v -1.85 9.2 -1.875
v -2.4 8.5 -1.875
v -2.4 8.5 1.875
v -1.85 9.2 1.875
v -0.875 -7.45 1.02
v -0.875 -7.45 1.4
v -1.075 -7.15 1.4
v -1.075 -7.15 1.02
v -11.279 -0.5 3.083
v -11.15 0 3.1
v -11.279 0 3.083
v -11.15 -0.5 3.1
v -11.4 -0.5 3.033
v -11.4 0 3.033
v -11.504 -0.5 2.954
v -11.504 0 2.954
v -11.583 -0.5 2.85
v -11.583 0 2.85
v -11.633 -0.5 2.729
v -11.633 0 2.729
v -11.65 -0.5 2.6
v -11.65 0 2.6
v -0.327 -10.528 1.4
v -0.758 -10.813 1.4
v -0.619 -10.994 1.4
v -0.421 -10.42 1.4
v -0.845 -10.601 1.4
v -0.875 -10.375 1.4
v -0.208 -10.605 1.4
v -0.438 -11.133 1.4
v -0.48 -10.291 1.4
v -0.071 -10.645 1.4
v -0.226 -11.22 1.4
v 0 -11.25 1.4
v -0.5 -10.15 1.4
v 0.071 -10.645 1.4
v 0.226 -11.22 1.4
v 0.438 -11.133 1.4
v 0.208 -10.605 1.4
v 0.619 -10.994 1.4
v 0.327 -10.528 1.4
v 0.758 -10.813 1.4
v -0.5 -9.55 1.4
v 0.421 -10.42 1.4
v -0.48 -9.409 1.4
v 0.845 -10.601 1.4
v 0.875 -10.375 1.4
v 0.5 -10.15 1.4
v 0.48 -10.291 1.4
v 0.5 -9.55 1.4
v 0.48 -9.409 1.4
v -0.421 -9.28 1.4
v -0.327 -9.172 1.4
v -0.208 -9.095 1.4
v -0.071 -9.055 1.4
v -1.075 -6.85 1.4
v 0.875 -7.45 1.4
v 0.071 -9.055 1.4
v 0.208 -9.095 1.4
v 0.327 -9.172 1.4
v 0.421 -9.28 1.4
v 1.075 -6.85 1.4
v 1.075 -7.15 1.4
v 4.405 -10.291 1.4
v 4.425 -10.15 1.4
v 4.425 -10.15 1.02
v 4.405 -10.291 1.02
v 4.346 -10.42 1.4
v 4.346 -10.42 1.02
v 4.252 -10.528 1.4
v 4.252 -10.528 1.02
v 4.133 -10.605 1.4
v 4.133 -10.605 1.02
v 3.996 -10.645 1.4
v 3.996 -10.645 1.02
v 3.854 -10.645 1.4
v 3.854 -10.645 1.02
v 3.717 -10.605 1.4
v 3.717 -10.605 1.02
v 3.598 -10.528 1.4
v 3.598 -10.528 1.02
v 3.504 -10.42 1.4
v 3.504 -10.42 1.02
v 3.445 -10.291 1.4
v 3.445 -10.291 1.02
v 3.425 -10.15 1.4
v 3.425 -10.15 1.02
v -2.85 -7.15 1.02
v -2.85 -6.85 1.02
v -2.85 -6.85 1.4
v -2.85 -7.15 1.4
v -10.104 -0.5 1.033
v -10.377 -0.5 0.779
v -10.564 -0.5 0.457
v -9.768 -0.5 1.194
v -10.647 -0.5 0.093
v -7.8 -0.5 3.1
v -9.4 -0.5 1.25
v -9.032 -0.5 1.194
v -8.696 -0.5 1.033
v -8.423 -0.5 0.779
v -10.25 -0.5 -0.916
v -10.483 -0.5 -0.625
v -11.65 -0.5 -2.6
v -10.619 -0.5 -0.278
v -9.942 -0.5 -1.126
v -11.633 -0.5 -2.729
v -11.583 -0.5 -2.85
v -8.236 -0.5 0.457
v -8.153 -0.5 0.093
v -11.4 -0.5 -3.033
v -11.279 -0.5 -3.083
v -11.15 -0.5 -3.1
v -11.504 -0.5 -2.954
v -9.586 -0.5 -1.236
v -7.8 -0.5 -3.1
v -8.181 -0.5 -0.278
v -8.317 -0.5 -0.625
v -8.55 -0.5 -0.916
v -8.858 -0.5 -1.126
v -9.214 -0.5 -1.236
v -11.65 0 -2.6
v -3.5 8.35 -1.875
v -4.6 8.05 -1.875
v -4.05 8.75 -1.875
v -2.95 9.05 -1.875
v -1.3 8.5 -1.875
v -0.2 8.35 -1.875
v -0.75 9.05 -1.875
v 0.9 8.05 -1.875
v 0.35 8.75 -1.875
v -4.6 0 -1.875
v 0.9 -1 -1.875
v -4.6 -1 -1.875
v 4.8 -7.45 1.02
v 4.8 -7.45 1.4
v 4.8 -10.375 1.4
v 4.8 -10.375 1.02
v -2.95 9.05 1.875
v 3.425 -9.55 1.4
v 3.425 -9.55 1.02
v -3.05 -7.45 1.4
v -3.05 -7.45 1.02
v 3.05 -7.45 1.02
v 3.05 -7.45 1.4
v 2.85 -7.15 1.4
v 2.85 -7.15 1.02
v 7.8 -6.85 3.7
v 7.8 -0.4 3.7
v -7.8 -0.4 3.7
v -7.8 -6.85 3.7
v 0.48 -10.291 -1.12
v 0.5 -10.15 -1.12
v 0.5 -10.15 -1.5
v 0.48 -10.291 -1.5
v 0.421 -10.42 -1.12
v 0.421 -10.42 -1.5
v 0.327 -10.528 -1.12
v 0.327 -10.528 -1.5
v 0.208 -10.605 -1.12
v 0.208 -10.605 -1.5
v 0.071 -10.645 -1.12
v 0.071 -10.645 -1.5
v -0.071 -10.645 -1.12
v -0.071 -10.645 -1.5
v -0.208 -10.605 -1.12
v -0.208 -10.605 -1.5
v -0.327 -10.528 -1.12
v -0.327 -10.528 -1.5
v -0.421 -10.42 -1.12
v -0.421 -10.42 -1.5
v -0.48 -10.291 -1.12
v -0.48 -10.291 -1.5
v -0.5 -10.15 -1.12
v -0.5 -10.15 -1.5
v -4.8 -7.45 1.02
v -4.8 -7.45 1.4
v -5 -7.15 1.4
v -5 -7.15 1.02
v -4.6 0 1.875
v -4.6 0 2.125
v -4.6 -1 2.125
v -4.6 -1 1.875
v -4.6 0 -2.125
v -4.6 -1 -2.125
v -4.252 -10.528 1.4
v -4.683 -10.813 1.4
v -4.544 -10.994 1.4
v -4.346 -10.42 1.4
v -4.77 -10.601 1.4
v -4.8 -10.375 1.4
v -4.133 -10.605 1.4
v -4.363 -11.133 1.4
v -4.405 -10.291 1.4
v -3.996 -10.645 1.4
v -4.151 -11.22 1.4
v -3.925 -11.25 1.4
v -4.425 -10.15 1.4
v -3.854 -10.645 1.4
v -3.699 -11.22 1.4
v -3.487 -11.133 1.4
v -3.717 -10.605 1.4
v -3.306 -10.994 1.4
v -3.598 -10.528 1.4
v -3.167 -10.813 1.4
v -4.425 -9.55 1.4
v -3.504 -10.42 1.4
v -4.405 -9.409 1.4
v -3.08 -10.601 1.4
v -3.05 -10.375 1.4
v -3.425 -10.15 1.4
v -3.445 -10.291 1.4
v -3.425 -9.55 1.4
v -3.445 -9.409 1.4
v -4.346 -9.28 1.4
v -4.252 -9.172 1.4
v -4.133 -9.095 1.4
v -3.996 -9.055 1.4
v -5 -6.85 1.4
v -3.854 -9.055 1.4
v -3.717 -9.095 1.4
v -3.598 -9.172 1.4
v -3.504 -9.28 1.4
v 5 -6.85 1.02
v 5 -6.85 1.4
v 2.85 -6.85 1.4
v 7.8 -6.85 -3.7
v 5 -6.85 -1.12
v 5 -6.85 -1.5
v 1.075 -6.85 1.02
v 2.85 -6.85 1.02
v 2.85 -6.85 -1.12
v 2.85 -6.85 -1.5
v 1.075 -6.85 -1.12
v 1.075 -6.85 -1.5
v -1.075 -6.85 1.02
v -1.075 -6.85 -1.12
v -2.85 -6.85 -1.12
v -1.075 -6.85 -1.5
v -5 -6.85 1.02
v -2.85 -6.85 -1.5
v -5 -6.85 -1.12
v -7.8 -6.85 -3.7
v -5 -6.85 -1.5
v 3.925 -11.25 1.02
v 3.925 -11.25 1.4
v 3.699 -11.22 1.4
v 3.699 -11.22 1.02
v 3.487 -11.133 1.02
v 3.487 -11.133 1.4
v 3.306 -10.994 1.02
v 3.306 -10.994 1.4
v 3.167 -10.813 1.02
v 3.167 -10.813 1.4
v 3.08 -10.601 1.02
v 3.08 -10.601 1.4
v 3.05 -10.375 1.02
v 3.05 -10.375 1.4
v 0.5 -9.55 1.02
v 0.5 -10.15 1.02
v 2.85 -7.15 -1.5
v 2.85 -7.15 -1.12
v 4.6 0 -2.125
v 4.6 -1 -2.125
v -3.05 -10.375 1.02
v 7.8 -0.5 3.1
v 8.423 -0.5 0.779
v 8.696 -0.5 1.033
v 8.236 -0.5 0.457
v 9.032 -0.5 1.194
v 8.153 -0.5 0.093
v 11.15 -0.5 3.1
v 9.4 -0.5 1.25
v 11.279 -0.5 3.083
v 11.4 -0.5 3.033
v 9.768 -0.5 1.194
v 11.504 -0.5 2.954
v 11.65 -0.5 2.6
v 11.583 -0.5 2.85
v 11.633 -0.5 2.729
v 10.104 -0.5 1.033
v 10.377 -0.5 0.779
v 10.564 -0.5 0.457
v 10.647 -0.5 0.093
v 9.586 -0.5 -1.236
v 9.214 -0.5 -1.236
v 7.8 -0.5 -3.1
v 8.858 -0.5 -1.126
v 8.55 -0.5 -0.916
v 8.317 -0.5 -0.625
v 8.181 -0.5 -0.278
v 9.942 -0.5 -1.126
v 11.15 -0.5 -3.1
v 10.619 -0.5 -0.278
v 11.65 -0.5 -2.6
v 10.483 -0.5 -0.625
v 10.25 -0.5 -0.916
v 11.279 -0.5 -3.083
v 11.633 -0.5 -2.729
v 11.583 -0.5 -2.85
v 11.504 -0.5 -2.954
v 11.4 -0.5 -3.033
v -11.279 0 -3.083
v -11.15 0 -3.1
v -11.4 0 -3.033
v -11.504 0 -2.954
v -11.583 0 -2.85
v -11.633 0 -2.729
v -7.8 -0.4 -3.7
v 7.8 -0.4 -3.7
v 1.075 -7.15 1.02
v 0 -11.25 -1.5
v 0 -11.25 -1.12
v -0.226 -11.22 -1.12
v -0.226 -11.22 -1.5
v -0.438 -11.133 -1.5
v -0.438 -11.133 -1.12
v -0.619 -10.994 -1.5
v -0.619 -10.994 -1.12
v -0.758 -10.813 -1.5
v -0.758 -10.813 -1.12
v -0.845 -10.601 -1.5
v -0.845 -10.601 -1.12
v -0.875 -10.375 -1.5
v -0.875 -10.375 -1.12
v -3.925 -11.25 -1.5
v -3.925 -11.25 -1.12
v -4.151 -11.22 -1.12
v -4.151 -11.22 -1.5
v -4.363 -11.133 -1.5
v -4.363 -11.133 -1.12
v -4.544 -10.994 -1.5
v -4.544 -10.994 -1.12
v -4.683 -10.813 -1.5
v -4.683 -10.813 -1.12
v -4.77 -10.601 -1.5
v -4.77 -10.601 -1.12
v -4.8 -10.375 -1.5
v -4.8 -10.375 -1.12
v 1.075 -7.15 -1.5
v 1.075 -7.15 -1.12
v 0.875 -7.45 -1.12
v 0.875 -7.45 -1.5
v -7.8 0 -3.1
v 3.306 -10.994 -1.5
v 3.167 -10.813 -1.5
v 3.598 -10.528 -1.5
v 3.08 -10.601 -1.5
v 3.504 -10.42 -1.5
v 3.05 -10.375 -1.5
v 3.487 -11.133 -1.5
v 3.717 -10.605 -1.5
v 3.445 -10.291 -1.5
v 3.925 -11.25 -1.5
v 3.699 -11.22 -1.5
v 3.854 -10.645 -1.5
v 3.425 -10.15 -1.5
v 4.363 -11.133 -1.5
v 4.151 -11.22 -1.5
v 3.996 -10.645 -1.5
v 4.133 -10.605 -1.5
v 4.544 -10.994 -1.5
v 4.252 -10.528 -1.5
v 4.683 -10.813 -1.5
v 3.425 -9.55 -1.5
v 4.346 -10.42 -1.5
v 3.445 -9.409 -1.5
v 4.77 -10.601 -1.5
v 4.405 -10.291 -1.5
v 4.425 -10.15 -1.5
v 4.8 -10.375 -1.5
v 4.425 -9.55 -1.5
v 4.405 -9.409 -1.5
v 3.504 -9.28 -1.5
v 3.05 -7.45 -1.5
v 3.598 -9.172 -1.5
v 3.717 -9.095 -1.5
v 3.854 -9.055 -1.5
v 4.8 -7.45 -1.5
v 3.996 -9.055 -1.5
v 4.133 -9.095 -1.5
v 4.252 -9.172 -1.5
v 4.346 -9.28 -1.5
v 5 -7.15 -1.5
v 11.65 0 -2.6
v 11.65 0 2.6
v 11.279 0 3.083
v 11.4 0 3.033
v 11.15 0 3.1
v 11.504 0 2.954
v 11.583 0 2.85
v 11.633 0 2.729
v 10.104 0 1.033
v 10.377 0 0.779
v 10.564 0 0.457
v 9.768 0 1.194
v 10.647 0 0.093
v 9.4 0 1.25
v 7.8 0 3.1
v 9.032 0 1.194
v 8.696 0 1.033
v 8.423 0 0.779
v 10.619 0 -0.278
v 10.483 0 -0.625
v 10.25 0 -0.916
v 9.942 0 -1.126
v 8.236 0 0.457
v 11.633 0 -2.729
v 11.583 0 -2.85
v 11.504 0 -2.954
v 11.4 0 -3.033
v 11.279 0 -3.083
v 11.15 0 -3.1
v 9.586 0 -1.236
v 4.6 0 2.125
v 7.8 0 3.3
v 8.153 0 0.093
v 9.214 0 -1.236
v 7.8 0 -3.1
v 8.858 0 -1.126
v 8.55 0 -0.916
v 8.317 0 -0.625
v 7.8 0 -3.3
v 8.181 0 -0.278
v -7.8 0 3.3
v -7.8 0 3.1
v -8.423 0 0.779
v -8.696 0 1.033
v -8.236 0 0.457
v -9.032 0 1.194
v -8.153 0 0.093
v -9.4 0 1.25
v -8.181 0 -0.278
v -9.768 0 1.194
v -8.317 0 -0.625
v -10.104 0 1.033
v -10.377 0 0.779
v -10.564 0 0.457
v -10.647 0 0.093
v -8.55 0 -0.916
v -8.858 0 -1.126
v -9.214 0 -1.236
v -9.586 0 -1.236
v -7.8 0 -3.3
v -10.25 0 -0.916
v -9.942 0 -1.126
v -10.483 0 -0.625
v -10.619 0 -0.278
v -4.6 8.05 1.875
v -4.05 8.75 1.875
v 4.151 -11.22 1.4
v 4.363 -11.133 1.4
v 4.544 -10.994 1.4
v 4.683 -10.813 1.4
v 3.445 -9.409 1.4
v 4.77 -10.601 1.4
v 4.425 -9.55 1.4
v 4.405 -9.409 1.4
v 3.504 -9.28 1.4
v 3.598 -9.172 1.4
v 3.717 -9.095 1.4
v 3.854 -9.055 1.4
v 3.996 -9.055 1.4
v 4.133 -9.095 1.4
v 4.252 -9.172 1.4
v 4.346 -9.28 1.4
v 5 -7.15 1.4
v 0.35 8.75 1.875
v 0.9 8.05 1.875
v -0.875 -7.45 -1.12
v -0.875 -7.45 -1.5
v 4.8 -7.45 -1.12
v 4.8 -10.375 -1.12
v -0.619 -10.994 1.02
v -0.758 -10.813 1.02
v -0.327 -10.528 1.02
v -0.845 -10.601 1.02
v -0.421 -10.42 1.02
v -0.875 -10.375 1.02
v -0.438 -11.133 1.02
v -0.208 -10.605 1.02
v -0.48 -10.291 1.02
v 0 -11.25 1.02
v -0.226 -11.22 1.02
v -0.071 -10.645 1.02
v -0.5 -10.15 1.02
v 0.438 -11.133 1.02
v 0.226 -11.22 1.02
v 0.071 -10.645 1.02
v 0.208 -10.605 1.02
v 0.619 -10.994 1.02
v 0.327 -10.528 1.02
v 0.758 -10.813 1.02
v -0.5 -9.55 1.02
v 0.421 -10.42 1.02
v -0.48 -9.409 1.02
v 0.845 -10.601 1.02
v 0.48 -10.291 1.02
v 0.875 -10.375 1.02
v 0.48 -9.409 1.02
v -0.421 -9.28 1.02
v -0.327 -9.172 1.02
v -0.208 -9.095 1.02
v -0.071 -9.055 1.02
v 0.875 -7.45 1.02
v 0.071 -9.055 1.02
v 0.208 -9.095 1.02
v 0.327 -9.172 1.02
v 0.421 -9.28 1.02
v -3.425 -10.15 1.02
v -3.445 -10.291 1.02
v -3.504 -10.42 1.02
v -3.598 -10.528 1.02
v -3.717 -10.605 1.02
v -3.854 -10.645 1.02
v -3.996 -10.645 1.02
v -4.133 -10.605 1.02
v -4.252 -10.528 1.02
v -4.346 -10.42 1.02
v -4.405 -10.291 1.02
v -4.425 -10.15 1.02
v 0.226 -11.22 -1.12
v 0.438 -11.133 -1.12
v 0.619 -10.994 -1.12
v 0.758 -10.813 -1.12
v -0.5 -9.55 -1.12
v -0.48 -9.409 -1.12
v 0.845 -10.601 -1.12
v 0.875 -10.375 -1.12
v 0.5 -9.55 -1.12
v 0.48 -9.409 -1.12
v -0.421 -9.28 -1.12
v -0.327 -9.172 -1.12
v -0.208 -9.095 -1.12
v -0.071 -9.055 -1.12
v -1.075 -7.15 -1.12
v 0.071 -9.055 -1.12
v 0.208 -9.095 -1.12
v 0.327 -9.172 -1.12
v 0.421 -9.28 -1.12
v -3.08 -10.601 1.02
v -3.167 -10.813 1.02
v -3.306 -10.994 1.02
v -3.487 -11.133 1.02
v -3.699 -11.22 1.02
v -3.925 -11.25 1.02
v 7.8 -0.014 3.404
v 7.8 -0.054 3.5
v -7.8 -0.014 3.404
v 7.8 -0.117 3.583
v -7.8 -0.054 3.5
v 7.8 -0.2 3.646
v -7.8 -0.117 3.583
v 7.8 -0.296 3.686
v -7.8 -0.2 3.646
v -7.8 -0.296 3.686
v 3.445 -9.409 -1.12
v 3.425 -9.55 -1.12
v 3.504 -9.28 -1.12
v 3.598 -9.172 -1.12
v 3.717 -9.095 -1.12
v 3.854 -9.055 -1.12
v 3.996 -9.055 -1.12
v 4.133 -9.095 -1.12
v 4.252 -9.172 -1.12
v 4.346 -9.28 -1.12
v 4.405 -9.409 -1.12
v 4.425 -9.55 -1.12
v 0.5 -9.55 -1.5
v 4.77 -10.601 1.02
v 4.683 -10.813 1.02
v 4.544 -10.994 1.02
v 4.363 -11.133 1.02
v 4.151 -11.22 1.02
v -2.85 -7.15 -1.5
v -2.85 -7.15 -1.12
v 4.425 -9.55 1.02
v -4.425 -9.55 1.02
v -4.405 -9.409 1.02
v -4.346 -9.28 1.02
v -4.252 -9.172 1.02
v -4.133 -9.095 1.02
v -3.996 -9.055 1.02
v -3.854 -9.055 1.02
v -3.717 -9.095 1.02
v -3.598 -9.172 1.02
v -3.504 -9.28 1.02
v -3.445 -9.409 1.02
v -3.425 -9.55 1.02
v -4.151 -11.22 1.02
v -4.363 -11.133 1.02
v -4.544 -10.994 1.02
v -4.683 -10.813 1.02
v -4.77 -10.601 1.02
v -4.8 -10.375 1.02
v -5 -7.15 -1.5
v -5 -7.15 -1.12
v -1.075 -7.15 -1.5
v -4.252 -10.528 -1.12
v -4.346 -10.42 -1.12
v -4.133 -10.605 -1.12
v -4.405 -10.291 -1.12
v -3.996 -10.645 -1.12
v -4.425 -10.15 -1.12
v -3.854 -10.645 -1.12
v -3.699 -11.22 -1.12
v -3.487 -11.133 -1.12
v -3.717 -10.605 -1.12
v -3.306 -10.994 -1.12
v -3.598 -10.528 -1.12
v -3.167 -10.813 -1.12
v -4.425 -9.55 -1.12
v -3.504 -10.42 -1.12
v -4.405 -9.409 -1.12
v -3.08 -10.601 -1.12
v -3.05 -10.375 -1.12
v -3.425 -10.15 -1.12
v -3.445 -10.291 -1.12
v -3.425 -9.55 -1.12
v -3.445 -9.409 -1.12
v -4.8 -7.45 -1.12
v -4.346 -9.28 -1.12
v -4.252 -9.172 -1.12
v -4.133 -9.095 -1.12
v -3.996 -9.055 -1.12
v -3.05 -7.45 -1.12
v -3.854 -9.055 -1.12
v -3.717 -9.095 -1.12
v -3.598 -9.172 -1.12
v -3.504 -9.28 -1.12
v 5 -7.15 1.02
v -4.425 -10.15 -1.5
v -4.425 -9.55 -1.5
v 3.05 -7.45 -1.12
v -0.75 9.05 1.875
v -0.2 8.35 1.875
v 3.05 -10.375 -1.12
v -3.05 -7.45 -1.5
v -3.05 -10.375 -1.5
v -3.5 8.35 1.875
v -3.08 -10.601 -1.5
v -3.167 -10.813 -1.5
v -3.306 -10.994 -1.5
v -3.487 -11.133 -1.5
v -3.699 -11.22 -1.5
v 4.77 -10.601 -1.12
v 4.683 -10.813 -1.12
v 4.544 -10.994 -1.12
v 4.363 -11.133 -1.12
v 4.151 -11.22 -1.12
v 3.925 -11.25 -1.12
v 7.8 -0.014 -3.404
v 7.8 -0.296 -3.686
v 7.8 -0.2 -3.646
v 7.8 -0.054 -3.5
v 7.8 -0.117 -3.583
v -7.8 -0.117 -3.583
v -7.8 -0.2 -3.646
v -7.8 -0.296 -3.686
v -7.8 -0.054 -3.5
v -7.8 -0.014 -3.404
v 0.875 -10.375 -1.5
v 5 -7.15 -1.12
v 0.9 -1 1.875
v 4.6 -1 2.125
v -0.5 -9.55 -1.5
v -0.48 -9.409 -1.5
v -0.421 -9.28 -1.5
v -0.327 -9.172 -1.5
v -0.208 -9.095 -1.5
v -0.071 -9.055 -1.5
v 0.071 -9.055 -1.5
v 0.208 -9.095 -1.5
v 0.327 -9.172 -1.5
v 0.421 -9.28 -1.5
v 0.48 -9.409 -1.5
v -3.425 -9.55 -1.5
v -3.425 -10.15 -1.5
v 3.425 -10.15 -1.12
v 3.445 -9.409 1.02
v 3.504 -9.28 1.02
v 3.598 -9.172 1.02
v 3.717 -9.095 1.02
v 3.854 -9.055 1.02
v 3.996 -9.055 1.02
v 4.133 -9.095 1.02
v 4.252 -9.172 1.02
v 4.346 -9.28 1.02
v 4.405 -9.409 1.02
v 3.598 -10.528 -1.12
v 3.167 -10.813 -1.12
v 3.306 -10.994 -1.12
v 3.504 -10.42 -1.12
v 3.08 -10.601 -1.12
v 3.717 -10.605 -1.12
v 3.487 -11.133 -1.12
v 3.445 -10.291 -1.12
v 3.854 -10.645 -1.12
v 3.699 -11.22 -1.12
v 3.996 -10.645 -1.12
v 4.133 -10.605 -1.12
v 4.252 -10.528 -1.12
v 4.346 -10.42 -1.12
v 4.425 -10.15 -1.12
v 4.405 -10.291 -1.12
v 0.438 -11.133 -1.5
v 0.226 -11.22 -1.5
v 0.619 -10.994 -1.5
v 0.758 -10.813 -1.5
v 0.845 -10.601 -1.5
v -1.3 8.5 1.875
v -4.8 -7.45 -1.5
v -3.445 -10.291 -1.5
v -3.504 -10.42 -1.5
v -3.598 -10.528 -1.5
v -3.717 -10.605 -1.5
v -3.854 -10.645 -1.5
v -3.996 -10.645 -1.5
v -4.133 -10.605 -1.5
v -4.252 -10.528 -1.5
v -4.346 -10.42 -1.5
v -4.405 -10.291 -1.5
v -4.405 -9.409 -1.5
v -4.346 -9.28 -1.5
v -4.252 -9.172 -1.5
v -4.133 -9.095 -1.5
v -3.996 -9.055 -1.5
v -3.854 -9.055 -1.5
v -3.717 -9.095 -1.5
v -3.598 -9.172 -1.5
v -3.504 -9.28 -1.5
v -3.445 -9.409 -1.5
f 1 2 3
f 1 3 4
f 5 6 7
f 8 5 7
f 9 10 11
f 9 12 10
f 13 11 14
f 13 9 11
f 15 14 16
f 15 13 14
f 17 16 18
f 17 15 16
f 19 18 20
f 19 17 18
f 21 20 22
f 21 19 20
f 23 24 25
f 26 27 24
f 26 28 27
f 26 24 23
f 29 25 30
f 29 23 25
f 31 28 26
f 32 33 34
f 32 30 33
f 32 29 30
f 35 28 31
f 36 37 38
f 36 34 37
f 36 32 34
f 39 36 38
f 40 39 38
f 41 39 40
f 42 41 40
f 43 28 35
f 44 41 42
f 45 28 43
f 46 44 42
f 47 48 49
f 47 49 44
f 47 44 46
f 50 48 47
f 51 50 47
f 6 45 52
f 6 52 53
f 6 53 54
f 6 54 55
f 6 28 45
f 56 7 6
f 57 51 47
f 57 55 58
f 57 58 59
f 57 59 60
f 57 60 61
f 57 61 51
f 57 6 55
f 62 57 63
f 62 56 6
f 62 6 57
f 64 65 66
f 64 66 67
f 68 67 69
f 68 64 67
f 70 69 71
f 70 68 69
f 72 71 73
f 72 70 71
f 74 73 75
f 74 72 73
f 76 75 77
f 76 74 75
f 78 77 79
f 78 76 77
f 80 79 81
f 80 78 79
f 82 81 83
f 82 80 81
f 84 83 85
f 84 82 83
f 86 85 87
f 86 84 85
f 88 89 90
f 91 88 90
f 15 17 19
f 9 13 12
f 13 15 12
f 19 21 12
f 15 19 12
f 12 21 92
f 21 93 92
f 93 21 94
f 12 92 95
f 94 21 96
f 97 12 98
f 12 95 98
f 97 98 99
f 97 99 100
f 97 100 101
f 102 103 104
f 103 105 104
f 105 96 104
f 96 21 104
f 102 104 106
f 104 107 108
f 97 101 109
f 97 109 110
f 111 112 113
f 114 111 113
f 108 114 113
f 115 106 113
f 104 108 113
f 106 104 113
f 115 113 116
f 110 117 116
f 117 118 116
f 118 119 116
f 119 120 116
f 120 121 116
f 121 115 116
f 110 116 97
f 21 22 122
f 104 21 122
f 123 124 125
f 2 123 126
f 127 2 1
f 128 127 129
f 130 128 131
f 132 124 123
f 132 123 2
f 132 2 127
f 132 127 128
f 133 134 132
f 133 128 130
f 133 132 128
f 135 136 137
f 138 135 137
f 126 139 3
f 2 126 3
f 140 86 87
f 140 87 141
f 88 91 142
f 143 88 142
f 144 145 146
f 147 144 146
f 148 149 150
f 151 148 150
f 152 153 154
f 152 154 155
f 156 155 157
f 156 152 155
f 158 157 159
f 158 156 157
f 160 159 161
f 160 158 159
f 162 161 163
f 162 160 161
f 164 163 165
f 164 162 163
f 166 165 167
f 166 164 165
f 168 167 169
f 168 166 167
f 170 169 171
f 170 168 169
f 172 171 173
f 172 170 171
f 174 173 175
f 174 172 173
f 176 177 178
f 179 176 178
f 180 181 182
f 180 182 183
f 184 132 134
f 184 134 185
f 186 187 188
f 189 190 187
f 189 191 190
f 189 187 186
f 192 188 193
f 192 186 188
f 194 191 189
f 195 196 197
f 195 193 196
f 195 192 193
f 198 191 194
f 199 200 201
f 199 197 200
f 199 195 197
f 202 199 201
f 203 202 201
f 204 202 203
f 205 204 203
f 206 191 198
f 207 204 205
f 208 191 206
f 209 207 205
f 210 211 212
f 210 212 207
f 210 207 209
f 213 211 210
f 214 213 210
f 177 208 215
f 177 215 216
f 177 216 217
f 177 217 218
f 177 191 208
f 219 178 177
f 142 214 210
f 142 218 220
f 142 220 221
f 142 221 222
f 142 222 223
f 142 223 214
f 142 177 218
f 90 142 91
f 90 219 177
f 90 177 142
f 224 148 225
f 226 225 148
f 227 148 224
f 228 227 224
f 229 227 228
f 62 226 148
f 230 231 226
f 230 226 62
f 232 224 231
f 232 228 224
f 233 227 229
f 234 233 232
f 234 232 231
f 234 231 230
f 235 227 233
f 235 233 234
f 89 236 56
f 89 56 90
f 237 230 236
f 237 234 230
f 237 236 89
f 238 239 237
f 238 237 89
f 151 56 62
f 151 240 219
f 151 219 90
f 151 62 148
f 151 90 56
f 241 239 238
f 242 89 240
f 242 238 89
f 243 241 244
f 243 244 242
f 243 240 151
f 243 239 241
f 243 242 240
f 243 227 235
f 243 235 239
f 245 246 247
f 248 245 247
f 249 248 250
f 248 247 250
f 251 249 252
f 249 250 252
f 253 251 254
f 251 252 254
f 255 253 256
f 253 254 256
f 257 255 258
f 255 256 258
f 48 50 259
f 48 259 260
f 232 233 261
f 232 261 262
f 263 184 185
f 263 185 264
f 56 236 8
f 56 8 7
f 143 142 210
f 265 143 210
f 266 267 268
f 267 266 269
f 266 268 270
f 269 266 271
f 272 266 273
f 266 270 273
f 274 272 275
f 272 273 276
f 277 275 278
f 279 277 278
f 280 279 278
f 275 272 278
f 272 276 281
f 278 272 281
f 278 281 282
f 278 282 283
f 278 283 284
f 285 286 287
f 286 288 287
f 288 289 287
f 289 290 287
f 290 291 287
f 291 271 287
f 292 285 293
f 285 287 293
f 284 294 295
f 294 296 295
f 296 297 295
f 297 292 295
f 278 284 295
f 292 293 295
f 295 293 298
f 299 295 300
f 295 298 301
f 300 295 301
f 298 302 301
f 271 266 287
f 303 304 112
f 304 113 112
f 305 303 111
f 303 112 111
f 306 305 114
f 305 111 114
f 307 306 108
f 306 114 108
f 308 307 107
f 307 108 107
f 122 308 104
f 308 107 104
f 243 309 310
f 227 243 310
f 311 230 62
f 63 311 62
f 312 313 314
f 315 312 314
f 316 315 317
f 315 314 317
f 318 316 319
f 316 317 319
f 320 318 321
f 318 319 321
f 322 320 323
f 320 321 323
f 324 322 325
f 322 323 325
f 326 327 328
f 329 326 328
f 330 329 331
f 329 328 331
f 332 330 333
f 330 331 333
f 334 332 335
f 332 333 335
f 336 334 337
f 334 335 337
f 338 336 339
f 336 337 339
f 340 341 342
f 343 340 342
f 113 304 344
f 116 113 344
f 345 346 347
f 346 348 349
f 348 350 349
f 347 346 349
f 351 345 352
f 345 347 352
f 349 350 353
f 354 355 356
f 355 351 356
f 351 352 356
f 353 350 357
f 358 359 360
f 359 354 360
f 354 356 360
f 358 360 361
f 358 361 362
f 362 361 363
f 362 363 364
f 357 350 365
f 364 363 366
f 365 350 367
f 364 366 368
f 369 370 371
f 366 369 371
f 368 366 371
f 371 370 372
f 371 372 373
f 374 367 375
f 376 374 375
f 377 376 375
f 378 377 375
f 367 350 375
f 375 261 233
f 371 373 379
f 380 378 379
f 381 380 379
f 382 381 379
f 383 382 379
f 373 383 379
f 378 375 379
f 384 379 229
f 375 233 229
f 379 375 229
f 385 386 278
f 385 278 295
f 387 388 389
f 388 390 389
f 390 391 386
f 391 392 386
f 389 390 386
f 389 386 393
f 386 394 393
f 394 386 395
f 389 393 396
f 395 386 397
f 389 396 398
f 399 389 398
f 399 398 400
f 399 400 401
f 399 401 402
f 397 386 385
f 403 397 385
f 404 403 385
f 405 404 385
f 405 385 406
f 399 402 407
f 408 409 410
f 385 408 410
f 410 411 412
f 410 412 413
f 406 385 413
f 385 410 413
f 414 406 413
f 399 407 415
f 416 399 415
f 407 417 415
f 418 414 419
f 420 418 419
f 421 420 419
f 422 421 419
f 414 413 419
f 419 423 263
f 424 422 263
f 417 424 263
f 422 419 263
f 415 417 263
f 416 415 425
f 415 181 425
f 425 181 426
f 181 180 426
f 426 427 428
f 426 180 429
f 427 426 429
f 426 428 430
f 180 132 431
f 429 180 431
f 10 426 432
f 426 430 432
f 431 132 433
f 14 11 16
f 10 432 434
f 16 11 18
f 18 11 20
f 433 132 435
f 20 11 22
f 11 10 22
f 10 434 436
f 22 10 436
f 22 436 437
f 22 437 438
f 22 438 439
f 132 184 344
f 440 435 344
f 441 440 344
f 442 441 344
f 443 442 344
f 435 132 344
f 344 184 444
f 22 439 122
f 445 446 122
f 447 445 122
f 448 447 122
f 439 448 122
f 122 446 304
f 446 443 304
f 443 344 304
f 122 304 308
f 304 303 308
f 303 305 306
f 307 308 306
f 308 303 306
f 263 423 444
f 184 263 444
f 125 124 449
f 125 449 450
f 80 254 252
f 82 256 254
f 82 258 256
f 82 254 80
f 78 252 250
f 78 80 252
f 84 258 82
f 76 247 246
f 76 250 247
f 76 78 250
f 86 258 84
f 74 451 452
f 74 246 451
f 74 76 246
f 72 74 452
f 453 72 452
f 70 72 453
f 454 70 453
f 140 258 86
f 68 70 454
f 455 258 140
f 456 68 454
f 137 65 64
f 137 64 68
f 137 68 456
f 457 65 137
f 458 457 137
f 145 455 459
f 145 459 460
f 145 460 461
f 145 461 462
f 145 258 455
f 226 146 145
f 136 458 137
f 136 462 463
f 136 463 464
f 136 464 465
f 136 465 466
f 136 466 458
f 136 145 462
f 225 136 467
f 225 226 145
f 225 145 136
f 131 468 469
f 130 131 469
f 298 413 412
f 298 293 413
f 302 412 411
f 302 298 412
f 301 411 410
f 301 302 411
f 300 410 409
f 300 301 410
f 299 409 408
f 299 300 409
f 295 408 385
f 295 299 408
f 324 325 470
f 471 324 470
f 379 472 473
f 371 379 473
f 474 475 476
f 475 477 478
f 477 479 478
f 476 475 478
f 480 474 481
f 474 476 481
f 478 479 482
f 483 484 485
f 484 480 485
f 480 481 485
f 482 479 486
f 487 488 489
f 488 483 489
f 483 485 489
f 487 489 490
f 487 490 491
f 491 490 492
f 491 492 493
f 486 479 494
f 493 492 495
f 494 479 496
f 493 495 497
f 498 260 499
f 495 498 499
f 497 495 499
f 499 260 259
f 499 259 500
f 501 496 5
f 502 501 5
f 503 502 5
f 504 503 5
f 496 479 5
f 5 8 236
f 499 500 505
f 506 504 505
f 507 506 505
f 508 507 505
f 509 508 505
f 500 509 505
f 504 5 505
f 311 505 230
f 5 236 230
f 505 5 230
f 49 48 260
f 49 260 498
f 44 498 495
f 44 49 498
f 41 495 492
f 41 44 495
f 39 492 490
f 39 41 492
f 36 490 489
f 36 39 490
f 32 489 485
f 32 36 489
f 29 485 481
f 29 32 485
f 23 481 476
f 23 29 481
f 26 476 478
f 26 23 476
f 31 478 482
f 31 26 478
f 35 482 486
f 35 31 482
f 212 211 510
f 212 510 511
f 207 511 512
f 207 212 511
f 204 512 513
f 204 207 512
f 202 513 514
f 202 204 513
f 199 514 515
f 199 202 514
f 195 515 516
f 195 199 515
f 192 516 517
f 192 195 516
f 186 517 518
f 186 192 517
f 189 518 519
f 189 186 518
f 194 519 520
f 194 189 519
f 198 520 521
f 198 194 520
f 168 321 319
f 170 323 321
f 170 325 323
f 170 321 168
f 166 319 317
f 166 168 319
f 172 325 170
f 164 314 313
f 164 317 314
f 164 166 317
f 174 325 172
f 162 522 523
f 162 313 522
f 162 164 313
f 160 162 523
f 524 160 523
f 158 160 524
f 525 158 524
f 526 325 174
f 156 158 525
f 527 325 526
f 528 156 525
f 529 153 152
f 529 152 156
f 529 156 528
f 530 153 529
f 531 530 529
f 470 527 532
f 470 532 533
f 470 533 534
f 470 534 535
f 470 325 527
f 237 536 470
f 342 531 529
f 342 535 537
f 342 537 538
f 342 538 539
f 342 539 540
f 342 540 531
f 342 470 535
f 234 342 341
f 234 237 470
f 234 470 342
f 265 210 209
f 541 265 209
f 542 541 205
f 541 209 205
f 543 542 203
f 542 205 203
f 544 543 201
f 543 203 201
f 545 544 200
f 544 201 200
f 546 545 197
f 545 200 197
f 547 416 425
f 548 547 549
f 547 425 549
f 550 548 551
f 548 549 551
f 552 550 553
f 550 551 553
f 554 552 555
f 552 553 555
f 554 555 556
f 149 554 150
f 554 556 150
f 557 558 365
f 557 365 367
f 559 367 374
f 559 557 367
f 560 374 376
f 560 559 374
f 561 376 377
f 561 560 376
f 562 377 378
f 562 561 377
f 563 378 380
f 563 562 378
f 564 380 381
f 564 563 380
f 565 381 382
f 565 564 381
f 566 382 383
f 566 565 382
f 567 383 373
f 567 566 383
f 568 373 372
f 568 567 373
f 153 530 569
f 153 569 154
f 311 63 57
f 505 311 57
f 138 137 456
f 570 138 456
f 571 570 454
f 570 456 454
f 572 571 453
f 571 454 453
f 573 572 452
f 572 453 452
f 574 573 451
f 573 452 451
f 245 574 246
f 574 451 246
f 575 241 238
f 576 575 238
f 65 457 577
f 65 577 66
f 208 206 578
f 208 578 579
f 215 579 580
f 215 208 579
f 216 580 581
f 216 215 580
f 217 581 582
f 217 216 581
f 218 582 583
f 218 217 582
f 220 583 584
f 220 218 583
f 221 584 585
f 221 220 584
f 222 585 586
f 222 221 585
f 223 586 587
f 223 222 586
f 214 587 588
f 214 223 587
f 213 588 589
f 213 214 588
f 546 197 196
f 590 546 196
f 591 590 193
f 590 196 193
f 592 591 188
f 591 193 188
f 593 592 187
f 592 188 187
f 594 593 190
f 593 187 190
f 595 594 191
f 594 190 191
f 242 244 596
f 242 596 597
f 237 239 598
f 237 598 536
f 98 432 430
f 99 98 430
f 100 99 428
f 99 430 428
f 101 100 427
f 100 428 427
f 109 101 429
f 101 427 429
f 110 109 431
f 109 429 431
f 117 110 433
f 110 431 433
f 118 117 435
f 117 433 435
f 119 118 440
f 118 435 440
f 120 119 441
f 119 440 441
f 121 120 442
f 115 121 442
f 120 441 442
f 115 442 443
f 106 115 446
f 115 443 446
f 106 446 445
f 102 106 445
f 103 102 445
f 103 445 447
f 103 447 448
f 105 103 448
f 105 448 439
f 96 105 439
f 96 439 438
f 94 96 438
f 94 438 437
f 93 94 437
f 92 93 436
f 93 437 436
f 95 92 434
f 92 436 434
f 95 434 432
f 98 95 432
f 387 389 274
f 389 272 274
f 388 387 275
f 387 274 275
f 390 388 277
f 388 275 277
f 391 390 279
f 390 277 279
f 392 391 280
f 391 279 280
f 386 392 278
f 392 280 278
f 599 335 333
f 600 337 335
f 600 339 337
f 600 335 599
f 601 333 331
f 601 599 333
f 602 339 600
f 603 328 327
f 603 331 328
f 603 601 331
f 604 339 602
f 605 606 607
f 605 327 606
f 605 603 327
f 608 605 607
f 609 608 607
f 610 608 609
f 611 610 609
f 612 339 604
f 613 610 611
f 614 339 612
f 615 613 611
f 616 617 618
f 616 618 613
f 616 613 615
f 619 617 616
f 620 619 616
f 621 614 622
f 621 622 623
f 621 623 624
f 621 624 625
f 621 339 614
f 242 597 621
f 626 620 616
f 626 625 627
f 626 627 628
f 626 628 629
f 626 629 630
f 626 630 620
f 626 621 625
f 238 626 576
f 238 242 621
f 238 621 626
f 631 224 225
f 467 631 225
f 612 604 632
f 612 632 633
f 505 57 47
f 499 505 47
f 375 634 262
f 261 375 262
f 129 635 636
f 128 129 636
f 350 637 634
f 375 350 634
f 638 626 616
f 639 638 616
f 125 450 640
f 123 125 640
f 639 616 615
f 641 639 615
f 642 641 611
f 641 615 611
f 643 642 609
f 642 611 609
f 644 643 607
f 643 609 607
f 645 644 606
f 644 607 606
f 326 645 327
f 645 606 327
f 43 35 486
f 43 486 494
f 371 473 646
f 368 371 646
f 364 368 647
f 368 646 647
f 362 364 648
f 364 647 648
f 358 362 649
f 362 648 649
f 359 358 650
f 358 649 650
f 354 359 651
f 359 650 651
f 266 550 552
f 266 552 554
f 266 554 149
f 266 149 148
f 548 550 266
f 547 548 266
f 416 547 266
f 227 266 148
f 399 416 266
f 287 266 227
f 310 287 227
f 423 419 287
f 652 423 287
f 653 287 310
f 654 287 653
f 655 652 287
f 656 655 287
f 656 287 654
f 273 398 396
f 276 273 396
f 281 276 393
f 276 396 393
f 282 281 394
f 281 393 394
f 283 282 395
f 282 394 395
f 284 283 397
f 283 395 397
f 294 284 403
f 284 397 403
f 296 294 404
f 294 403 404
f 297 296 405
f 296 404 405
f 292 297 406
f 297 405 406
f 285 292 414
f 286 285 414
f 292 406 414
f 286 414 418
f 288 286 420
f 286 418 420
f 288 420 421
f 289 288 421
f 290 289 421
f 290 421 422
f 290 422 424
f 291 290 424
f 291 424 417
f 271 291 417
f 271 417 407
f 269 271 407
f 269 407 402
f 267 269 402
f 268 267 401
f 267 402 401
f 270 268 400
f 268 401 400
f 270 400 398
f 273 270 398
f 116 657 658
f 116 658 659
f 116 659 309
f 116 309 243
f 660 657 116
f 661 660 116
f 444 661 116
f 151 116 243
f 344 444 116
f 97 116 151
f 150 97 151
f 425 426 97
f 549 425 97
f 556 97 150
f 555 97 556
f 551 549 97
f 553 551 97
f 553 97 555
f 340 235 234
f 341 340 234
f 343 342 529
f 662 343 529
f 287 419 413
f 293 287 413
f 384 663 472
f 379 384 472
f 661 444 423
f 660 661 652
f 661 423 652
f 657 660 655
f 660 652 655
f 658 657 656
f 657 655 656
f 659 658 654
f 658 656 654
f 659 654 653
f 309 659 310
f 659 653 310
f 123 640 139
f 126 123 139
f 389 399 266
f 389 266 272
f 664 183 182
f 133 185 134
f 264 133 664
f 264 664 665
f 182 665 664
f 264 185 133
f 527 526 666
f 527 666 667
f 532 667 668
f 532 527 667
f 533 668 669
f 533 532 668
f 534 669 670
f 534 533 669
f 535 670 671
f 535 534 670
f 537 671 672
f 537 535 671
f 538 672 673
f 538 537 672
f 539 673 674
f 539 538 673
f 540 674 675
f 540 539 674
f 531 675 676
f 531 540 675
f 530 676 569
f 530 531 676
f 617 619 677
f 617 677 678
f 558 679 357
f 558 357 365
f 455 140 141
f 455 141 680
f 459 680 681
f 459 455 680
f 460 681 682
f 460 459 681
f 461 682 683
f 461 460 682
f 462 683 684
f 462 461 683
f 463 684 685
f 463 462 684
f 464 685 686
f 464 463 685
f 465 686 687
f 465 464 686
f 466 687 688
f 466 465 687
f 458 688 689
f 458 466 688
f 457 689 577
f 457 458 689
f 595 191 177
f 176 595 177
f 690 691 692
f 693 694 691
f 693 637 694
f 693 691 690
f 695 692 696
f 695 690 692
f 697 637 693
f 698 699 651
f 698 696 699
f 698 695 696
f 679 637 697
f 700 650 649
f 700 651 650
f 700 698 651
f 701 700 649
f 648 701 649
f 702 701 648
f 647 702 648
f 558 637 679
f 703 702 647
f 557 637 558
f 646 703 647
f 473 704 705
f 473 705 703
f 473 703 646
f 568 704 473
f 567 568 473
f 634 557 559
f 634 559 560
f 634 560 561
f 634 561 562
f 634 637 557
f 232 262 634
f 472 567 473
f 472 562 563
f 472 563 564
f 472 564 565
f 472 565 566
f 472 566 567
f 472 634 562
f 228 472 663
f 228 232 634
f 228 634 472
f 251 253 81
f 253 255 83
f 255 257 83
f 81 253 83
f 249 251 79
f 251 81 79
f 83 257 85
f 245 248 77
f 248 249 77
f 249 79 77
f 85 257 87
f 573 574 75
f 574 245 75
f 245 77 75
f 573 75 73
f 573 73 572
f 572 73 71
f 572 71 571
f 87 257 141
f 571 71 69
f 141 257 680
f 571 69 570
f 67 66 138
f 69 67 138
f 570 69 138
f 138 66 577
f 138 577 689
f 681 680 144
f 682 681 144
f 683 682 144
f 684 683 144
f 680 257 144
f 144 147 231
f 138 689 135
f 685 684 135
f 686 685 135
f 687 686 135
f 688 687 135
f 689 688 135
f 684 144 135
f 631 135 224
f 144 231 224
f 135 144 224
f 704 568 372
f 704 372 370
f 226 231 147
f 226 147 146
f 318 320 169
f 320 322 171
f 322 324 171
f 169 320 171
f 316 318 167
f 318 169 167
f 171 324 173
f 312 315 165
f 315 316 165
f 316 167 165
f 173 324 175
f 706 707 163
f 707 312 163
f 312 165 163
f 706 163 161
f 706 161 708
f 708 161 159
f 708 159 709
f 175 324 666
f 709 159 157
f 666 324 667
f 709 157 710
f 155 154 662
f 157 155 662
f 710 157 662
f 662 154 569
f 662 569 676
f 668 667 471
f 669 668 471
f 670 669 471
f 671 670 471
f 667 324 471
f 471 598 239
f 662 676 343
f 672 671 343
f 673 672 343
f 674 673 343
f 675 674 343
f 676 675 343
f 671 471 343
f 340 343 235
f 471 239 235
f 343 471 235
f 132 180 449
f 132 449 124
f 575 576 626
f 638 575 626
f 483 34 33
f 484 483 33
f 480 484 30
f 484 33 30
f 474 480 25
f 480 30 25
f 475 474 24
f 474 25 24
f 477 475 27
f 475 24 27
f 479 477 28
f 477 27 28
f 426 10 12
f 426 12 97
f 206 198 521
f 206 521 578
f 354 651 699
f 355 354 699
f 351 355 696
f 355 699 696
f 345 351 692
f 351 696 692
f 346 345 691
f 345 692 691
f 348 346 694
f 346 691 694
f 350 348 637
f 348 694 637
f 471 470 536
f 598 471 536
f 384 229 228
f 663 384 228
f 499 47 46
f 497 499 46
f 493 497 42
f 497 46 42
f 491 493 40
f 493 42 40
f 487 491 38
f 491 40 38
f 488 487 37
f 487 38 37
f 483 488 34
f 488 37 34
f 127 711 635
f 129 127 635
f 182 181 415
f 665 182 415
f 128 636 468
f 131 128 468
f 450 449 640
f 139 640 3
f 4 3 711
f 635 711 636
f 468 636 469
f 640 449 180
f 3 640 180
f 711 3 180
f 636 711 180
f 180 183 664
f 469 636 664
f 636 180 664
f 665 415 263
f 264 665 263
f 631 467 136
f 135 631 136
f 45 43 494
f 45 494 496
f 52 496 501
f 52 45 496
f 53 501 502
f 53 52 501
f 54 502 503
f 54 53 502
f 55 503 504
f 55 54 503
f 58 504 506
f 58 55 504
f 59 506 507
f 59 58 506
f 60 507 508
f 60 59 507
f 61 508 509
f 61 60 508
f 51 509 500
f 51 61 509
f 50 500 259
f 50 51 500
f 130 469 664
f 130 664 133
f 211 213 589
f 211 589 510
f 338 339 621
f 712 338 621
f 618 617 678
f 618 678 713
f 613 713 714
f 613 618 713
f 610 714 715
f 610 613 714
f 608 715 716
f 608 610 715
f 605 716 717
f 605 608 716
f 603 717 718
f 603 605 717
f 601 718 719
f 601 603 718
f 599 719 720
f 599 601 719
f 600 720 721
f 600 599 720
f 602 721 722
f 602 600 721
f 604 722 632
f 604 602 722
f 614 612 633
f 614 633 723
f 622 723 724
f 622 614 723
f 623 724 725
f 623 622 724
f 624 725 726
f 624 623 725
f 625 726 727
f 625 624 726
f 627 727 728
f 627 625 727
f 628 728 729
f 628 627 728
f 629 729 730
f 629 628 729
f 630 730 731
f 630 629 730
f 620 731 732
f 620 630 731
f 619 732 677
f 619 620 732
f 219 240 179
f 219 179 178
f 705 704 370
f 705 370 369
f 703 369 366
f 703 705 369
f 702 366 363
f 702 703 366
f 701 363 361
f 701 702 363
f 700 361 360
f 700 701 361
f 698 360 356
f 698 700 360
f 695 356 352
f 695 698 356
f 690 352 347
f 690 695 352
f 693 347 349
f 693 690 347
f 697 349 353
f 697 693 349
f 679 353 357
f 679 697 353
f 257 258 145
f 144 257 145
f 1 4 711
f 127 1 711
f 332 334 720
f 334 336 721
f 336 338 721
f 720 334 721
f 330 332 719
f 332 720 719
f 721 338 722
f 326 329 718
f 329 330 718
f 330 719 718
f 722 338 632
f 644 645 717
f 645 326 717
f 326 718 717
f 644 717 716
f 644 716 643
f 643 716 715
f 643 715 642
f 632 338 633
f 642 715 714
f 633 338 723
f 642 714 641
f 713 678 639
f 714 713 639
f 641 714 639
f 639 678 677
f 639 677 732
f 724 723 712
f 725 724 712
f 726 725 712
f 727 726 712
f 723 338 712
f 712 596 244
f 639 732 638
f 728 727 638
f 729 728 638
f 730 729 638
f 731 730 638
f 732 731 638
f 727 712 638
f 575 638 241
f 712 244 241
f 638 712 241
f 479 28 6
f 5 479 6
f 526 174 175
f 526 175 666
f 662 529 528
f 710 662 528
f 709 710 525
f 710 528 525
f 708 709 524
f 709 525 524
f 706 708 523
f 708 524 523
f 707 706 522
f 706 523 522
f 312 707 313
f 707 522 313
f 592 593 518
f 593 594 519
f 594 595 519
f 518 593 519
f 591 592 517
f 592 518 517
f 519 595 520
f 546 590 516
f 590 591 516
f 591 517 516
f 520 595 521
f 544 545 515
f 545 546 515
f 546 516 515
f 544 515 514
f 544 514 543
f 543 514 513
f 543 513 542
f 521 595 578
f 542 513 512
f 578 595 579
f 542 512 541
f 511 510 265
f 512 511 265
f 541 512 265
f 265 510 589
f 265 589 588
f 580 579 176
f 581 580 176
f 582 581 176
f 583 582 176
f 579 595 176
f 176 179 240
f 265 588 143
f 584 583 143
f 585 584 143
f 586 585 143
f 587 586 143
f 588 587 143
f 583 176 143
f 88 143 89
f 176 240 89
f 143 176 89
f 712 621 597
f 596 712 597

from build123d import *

# Parameters (mm, degrees)
ESQUISSE1_W           = 3.85
ESQUISSE1_H           = 6.2
ESQUISSE1_R           = 1.25
PLAQUE_DEPTH          = 0.5
CORPS_DEPTH           = 6.85
CONG_R                = 0.5
ESQUISSE2_W           = 9.2
ESQUISSE2_H           = 4.25
CAVIT_DEPTH           = 1
ESQUISSE3_W           = 5.5
ESQUISSE3_H           = 3.75
BOUTON_DEPTH          = 10.2
RELIEF_DEPTH          = 16.856958252
CONG_2_R              = 0.4
ESQUISSE6_W           = 2.15
ESQUISSE6_H           = 0.38
PIN_DEPTH             = 4.4
ARRONDI_DEPTH         = 0.38
PERCAGE_DEPTH         = 0.38
R_P_TITION_COUNT      = 3
R_P_TITION_PITCH      = 3.925
R_P_TITION_COUNT_DIR2 = 2
R_P_TITION_PITCH_DIR2 = 2.52


with BuildPart() as part:
    # Esquisse1 → Plaque (new body)
    # profile 1 of 2: a face of its own
    with BuildSketch(Plane(origin=(0, 0, 0), x_dir=(1, 0, 0), z_dir=(0, 1, 0))):
        with Locations((-9.725, 0)):
            Rectangle(ESQUISSE1_W, ESQUISSE1_H)
        with Locations(Location((-9.4, 0, 0), (0, 0, 270))):
            Circle(ESQUISSE1_R, mode=Mode.SUBTRACT)
    # profile 2 of 2: a face of its own
    with BuildSketch(Plane(origin=(0, 0, 0), x_dir=(1, 0, 0), z_dir=(0, 1, 0))):
        with Locations((9.725, 0)):
            Rectangle(ESQUISSE1_W, ESQUISSE1_H)
        with Locations(Location((9.4, 0, 0), (0, 0, 270))):
            Circle(ESQUISSE1_R, mode=Mode.SUBTRACT)
    extrude(amount=-PLAQUE_DEPTH)

    # Esquisse1<5> → Corps (add)
    with BuildSketch(Plane(origin=(0, 0, 0), x_dir=(1, 0, 0), z_dir=(0, 1, 0))):
        Polygon((7.8, 3.1), (7.8, -3.1), (7.8, -3.7), (-7.8, -3.7), (-7.8, -3.1), (-7.8, 3.1), (-7.8, 3.7), (7.8, 3.7), align=None)
    extrude(amount=-CORPS_DEPTH)

    # Congé
    cong_edges = [part.edges().sort_by_distance(p)[0] for p in [
        (-11.65, -0.25, 3.1),
        (-11.65, -0.25, -3.1),
        (11.65, -0.25, -3.1),
        (11.65, -0.25, 3.1),
    ]]
    fillet(cong_edges, radius=CONG_R)

    # Esquisse2 → Cavité (cut)
    with BuildSketch(Plane(origin=(0, 0, 0), x_dir=(1, 0, 0), z_dir=(0, 1, 0))):
        Rectangle(ESQUISSE2_W, ESQUISSE2_H)
    extrude(amount=-CAVIT_DEPTH, mode=Mode.SUBTRACT)

    # Esquisse3 → Bouton (add)
    with BuildSketch(Plane(origin=(0, -1, 0), x_dir=(1, 0, 0), z_dir=(0, 1, 0))):
        with Locations((-1.85, 0)):
            Rectangle(ESQUISSE3_W, ESQUISSE3_H)
    extrude(amount=BOUTON_DEPTH)

    # Esquisse5 → Relief (cut, through all)
    with BuildSketch(Plane.XY.offset(1.875)):
        Polygon((-4.6, 9.2), (-4.6, 8.05), (-4.05, 8.75), (-3.5, 8.35), (-2.95, 9.05), (-2.4, 8.5), (-1.85, 9.2), align=None)
        Polygon((0.9, 9.2), (-1.85, 9.2), (-1.3, 8.5), (-0.75, 9.05), (-0.2, 8.35), (0.35, 8.75), (0.9, 8.05), align=None)
    extrude(amount=-RELIEF_DEPTH, mode=Mode.SUBTRACT)

    # Congé2
    cong_2_edges = [part.edges().sort_by_distance(p)[0] for p in [
        (0, 0, -3.7),
        (0, 0, 3.7),
    ]]
    fillet(cong_2_edges, radius=CONG_2_R)

    # Esquisse6 → Pin (add)
    with BuildSketch(Plane.XZ.offset(6.85)):
        with Locations((-3.925, 1.21)):
            Rectangle(ESQUISSE6_W, ESQUISSE6_H)
    pin = extrude(amount=PIN_DEPTH)

    # Esquisse8 → Arrondi (cut)
    with BuildSketch(Plane.XY.offset(1.4)):
        with BuildLine():
            Line((-4.8, -7.45), (-5, -7.15))
            Line((-5, -7.15), (-5, -11.25))
            Line((-5, -11.25), (-3.925, -11.25))
            ThreePointArc((-3.925, -11.25), (-4.543718434, -10.993718434), (-4.8, -10.375))
            Line((-4.8, -10.375), (-4.8, -7.45))
        make_face()
        with BuildLine():
            Line((-2.85, -11.25), (-2.85, -7.15))
            Line((-2.85, -7.15), (-3.05, -7.45))
            Line((-3.05, -7.45), (-3.05, -10.375))
            ThreePointArc((-3.05, -10.375), (-3.306281566, -10.993718434), (-3.925, -11.25))
            Line((-3.925, -11.25), (-2.85, -11.25))
        make_face()
    arrondi = extrude(amount=-ARRONDI_DEPTH, mode=Mode.SUBTRACT)

    # Esquisse9 → Percage (cut)
    with BuildSketch(Plane.XY.offset(1.4)):
        with BuildLine():
            Line((-4.425, -10.15), (-4.425, -9.55))
            ThreePointArc((-4.425, -9.55), (-3.925, -9.05), (-3.425, -9.55))
            Line((-3.425, -9.55), (-3.425, -10.15))
            ThreePointArc((-3.425, -10.15), (-3.925, -10.65), (-4.425, -10.15))
        make_face()
    percage = extrude(amount=-PERCAGE_DEPTH, mode=Mode.SUBTRACT)

    # Répétition: Pin, Arrondi, Percage 3 × 2
    with Locations(*[(i * R_P_TITION_PITCH, 0, -j * R_P_TITION_PITCH_DIR2) for i in range(R_P_TITION_COUNT) for j in range(R_P_TITION_COUNT_DIR2) if (i, j) != (0, 0)]):
        add(pin)
        add(arrondi, mode=Mode.SUBTRACT)
        add(percage, mode=Mode.SUBTRACT)


solid = part.part
